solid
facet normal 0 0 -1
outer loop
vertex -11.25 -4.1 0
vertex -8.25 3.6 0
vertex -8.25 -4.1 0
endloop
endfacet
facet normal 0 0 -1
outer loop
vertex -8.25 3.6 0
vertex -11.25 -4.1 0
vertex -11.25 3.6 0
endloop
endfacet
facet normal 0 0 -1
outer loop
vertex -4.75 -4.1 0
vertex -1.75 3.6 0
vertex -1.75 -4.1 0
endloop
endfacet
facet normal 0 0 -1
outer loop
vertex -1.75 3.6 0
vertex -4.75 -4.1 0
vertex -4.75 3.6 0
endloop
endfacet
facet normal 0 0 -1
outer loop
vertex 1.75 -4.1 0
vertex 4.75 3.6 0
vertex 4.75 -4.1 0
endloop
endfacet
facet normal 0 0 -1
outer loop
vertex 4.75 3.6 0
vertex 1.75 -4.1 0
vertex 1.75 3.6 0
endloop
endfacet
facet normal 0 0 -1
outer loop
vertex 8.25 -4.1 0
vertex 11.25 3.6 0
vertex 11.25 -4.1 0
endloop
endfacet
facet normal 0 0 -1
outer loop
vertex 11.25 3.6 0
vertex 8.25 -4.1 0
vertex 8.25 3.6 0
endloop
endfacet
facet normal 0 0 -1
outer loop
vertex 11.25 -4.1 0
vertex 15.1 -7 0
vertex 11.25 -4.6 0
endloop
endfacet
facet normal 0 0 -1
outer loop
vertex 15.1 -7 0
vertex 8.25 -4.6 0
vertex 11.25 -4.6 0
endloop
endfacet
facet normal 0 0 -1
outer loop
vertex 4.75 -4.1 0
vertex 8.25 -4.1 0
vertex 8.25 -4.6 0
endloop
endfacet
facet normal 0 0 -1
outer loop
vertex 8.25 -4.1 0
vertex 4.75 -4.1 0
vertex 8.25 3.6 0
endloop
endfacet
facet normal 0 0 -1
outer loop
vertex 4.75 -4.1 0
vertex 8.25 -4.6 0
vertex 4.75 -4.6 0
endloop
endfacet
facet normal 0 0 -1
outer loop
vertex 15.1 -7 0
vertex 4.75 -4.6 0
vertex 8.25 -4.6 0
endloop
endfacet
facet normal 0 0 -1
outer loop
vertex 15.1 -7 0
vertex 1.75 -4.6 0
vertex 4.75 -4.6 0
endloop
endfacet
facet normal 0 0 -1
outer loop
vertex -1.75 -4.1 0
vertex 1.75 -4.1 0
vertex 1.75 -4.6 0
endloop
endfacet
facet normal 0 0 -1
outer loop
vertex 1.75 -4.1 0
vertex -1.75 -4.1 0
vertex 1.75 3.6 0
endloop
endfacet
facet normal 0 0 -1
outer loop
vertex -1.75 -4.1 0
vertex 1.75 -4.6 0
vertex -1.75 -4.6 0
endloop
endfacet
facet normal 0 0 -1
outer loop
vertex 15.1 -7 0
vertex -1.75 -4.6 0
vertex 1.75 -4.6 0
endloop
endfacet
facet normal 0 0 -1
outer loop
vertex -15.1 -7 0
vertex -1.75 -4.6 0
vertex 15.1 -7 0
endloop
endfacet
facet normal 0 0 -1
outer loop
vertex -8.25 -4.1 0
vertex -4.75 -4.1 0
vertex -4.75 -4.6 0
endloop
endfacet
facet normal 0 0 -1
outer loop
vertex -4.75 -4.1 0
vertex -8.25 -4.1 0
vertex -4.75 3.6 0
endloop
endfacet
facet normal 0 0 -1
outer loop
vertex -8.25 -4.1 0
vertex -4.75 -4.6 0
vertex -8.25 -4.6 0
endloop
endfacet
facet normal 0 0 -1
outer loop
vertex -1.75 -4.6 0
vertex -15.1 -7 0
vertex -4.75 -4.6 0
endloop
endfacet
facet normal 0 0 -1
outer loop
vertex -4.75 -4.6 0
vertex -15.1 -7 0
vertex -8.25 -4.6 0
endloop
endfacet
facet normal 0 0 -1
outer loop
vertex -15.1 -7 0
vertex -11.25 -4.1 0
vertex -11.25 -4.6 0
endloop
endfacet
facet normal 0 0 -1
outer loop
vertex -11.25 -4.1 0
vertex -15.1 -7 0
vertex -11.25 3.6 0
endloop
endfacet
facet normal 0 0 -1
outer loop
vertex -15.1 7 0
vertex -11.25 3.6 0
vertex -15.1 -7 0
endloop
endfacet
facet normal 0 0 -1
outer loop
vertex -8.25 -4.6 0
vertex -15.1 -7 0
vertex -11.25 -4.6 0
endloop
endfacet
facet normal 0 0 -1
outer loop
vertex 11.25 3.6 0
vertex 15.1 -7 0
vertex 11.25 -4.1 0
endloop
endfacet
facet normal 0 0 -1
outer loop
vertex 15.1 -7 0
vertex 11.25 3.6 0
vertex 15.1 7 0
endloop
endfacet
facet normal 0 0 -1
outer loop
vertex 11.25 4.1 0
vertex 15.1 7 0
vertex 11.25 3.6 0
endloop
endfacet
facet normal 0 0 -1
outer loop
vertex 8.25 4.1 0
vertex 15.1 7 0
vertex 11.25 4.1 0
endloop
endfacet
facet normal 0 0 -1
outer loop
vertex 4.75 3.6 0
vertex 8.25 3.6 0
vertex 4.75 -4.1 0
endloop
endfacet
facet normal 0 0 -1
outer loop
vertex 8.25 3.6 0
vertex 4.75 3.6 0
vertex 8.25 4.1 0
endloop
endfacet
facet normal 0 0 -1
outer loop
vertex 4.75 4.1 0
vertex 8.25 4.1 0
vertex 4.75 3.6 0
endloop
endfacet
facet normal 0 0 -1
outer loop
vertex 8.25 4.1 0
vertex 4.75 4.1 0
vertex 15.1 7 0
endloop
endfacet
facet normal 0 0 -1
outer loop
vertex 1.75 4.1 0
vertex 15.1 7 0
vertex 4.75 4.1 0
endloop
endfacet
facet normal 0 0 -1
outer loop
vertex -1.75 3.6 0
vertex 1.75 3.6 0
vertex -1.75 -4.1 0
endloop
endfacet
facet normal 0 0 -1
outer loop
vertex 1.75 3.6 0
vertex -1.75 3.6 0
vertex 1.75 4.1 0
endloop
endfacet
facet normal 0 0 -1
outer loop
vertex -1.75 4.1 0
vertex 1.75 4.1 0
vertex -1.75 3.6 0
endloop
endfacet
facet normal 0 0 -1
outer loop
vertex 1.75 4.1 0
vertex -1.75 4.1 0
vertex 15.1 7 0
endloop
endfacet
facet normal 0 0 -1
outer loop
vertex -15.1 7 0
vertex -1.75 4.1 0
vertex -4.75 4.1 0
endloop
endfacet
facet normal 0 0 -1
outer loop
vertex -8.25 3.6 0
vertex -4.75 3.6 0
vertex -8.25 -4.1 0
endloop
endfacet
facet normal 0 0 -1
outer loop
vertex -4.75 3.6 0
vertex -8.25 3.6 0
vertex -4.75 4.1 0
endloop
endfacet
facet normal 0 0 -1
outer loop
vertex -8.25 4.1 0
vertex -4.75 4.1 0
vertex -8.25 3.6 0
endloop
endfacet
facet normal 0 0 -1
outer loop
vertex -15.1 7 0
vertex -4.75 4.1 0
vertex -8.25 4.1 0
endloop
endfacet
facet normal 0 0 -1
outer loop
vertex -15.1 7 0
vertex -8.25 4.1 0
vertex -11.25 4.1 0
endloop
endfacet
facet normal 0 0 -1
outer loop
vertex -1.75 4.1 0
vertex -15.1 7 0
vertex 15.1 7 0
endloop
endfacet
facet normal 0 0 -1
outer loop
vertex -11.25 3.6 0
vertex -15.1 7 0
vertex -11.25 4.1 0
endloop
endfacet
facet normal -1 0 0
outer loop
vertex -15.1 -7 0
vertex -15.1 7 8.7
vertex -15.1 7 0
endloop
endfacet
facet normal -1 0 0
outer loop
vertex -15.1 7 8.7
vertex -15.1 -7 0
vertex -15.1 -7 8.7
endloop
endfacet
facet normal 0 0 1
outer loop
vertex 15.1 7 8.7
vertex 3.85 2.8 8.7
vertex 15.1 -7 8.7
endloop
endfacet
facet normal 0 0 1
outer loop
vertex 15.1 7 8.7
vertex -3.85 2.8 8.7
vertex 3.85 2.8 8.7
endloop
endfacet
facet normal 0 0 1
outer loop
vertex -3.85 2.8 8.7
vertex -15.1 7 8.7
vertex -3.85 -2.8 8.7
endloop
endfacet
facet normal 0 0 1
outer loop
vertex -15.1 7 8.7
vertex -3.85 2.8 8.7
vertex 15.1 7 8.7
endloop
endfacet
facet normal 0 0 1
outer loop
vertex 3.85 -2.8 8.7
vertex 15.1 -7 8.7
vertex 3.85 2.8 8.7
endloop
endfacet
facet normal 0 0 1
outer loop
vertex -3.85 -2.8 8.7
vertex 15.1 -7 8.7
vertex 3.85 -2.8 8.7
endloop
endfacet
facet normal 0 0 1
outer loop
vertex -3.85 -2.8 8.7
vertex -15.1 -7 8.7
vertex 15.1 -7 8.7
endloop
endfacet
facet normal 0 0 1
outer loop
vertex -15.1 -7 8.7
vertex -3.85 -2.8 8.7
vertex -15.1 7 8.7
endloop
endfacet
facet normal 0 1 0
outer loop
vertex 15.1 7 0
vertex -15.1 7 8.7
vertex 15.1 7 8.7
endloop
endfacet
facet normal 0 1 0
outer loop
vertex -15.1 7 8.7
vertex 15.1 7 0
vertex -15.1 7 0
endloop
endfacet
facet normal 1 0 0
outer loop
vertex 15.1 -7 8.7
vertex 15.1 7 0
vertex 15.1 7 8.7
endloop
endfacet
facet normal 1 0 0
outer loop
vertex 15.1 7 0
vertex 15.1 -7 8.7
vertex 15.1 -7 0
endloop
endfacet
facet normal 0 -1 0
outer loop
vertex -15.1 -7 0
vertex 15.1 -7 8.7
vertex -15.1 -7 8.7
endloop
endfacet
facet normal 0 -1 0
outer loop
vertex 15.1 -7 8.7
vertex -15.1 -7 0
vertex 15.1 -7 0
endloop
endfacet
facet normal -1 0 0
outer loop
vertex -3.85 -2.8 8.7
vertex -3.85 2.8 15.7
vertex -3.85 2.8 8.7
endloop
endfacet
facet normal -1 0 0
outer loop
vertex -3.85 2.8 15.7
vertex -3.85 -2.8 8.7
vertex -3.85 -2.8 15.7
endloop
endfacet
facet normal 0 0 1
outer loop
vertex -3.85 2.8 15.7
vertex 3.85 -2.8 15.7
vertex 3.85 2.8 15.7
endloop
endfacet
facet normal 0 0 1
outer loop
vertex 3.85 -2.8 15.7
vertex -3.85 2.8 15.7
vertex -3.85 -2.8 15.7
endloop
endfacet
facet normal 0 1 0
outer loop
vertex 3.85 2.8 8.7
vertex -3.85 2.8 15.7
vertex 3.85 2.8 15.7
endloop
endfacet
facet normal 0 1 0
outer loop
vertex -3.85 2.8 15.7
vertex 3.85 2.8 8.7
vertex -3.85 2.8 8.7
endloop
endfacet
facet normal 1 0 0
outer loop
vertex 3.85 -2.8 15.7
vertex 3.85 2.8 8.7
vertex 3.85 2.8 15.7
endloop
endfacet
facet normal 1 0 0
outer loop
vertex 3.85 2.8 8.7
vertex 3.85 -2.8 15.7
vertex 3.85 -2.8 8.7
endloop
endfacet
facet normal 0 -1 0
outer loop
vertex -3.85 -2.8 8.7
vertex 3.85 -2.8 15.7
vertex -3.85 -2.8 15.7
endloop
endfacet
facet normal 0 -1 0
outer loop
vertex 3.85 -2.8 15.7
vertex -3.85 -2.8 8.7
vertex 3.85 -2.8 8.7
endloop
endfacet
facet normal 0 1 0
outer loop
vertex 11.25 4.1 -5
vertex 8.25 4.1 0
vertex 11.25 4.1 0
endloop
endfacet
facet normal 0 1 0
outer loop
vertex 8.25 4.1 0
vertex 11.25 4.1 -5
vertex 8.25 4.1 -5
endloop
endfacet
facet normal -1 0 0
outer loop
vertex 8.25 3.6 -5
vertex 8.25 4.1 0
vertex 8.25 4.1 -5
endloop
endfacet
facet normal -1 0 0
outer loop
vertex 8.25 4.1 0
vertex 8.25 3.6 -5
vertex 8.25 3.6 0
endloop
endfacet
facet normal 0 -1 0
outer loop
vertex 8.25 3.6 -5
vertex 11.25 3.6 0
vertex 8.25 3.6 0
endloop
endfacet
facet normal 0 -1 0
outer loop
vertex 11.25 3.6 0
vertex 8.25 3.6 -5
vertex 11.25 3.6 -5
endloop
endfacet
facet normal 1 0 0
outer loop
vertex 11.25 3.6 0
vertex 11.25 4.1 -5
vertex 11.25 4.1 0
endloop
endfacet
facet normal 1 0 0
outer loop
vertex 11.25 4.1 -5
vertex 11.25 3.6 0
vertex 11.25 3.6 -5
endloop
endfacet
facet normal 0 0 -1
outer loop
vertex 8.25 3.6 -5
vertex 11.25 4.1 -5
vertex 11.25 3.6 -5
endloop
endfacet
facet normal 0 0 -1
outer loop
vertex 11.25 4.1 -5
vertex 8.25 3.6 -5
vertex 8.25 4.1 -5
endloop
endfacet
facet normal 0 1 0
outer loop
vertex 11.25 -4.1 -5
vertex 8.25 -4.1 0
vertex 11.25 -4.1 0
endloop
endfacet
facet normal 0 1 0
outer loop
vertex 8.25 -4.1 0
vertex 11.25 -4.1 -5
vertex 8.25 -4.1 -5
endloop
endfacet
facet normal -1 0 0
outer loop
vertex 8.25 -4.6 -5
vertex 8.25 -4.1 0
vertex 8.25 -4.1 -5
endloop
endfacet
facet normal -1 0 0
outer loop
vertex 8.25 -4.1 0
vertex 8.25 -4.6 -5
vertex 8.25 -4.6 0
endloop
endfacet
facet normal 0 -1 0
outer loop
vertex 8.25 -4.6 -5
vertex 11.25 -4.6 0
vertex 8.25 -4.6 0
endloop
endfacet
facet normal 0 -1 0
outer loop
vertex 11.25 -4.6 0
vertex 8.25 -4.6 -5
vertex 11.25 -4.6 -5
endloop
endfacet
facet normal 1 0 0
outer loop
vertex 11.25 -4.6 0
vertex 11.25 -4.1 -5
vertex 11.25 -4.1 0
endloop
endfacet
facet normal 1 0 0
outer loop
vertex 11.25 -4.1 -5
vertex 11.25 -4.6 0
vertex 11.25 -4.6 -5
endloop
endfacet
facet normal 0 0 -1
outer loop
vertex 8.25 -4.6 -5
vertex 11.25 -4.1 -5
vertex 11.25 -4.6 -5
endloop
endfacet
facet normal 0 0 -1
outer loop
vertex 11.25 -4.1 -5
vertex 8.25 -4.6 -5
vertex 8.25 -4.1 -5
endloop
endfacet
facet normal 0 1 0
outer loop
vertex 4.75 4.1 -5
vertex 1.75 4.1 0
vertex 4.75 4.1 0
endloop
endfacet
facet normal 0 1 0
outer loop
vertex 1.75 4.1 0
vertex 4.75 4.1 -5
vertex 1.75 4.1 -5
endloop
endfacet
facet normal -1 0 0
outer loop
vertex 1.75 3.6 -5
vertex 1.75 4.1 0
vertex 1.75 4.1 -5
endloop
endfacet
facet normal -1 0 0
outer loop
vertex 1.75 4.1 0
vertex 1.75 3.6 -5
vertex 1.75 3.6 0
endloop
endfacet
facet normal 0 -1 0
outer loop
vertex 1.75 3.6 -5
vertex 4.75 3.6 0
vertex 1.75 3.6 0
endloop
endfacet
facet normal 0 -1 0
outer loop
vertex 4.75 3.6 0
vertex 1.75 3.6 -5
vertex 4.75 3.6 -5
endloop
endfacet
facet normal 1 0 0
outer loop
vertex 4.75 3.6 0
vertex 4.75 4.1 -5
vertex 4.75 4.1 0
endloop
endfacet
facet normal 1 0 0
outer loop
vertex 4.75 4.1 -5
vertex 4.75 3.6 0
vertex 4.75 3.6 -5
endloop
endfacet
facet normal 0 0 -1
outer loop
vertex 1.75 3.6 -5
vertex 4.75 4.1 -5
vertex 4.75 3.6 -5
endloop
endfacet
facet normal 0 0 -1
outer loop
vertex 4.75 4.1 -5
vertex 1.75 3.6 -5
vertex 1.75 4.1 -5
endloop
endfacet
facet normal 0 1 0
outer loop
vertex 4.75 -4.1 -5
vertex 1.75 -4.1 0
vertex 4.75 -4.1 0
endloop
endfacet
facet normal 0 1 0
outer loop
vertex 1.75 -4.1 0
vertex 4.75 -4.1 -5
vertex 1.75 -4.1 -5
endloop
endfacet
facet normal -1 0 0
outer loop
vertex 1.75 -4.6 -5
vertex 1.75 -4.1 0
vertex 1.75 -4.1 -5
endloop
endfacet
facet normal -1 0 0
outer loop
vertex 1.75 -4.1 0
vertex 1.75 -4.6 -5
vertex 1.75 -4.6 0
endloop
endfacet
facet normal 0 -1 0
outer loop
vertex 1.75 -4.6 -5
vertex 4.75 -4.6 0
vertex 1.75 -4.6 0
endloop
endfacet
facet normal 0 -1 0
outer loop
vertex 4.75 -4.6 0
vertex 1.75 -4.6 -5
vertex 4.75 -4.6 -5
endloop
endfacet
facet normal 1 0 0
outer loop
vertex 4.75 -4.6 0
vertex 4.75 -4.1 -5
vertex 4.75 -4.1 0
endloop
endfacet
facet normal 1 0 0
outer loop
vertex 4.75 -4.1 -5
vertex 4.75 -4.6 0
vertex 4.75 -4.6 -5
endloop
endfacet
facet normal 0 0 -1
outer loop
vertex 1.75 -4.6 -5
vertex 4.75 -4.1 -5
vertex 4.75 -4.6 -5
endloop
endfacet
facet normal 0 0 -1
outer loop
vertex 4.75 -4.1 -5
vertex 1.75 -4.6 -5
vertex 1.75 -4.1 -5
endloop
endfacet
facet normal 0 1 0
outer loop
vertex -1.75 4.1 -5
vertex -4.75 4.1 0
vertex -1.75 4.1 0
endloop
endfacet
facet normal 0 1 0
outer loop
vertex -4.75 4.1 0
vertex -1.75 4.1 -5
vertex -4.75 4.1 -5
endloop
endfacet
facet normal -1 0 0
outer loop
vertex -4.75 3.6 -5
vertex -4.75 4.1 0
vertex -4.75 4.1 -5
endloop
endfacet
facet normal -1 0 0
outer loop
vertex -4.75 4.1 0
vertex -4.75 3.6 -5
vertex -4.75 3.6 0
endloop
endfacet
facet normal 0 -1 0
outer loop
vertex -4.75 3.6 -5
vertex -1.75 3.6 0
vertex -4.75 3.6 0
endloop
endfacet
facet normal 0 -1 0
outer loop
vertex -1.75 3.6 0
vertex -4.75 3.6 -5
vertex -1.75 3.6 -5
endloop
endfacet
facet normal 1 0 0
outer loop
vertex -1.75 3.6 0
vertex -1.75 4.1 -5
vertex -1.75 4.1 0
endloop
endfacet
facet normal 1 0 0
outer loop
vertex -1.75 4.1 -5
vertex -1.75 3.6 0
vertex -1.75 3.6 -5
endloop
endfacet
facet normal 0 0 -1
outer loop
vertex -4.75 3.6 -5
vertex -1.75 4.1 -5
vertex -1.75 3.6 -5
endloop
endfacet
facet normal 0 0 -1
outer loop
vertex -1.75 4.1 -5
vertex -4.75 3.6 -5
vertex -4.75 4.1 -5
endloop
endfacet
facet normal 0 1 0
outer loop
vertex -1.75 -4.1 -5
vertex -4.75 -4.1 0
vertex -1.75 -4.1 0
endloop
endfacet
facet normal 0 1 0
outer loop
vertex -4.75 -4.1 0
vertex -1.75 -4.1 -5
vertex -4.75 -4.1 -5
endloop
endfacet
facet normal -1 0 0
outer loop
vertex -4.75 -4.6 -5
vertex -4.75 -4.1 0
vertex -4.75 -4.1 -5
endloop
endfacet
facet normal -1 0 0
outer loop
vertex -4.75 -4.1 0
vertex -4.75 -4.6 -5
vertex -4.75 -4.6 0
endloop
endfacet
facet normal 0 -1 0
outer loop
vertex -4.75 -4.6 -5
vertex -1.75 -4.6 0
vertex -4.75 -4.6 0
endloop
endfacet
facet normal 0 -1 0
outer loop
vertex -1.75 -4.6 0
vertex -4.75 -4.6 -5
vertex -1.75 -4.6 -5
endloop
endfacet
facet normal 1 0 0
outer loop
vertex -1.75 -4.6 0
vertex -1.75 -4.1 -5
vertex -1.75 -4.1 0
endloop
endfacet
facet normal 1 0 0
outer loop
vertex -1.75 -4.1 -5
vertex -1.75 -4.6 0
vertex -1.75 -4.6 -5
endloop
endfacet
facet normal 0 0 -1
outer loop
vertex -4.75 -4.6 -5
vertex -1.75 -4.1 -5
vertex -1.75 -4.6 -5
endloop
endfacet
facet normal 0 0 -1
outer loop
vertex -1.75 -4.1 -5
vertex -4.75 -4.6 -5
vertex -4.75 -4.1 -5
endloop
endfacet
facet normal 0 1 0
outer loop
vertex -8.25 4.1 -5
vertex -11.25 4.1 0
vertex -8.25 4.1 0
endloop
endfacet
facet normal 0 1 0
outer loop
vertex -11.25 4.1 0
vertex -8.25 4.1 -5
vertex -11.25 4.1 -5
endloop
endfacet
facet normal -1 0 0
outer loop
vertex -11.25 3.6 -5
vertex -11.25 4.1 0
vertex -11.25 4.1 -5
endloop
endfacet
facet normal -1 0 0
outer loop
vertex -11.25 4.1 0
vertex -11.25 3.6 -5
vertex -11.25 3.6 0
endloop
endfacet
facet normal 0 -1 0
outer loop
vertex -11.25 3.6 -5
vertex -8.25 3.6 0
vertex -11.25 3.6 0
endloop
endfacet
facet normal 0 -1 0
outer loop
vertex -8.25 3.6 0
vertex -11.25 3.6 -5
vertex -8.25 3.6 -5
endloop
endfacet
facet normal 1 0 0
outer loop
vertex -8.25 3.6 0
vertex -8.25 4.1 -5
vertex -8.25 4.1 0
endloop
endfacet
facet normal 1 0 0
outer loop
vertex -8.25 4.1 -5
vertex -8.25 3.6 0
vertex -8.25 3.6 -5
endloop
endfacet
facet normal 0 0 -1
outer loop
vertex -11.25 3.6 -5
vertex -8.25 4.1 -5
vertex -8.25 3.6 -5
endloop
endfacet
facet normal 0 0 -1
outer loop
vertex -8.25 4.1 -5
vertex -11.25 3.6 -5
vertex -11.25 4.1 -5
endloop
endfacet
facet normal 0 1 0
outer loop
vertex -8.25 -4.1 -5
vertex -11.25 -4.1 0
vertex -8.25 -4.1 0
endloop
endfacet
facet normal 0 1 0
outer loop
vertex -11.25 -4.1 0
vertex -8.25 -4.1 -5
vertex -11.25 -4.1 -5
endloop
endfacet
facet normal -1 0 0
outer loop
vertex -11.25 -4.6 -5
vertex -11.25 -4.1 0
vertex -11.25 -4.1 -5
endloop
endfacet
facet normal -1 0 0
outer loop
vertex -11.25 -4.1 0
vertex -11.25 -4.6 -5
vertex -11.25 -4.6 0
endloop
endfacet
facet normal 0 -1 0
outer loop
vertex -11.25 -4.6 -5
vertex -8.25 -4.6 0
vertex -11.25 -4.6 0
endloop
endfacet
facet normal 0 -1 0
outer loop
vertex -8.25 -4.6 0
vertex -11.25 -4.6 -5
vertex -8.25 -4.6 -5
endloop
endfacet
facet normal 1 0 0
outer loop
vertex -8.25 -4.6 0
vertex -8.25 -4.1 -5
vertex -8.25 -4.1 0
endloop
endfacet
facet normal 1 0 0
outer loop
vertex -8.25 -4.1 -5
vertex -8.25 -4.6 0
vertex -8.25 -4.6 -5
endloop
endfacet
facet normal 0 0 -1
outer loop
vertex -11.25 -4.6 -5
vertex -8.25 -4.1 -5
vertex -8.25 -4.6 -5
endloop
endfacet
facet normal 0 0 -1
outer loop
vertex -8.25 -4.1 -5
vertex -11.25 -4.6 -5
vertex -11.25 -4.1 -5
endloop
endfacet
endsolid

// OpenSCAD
union(){linear_extrude(8.7) square([30.2,14], center= true);

translate([0,0,8.7]) linear_extrude(7) square([7.7,5.6], center=true);

rotate([90,0,0]) translate([9.75,-2.5,-4.1]) linear_extrude(0.5) square([3,5], center=true);

rotate([90,0,0]) translate([9.75,-2.5,4.1]) linear_extrude(0.5) square([3,5], center=true);


rotate([90,0,0]) translate([3.25,-2.5,-4.1]) linear_extrude(0.5) square([3,5], center=true);

rotate([90,0,0]) translate([3.25,-2.5,4.1]) linear_extrude(0.5) square([3,5], center=true);


rotate([90,0,0]) translate([-3.25,-2.5,-4.1]) linear_extrude(0.5) square([3,5], center=true);

rotate([90,0,0]) translate([-3.25,-2.5,4.1]) linear_extrude(0.5) square([3,5], center=true);


rotate([90,0,0]) translate([-9.75,-2.5,-4.1]) linear_extrude(0.5) square([3,5], center=true);

rotate([90,0,0]) translate([-9.75,-2.5,4.1]) linear_extrude(0.5) square([3,5], center=true);
}
